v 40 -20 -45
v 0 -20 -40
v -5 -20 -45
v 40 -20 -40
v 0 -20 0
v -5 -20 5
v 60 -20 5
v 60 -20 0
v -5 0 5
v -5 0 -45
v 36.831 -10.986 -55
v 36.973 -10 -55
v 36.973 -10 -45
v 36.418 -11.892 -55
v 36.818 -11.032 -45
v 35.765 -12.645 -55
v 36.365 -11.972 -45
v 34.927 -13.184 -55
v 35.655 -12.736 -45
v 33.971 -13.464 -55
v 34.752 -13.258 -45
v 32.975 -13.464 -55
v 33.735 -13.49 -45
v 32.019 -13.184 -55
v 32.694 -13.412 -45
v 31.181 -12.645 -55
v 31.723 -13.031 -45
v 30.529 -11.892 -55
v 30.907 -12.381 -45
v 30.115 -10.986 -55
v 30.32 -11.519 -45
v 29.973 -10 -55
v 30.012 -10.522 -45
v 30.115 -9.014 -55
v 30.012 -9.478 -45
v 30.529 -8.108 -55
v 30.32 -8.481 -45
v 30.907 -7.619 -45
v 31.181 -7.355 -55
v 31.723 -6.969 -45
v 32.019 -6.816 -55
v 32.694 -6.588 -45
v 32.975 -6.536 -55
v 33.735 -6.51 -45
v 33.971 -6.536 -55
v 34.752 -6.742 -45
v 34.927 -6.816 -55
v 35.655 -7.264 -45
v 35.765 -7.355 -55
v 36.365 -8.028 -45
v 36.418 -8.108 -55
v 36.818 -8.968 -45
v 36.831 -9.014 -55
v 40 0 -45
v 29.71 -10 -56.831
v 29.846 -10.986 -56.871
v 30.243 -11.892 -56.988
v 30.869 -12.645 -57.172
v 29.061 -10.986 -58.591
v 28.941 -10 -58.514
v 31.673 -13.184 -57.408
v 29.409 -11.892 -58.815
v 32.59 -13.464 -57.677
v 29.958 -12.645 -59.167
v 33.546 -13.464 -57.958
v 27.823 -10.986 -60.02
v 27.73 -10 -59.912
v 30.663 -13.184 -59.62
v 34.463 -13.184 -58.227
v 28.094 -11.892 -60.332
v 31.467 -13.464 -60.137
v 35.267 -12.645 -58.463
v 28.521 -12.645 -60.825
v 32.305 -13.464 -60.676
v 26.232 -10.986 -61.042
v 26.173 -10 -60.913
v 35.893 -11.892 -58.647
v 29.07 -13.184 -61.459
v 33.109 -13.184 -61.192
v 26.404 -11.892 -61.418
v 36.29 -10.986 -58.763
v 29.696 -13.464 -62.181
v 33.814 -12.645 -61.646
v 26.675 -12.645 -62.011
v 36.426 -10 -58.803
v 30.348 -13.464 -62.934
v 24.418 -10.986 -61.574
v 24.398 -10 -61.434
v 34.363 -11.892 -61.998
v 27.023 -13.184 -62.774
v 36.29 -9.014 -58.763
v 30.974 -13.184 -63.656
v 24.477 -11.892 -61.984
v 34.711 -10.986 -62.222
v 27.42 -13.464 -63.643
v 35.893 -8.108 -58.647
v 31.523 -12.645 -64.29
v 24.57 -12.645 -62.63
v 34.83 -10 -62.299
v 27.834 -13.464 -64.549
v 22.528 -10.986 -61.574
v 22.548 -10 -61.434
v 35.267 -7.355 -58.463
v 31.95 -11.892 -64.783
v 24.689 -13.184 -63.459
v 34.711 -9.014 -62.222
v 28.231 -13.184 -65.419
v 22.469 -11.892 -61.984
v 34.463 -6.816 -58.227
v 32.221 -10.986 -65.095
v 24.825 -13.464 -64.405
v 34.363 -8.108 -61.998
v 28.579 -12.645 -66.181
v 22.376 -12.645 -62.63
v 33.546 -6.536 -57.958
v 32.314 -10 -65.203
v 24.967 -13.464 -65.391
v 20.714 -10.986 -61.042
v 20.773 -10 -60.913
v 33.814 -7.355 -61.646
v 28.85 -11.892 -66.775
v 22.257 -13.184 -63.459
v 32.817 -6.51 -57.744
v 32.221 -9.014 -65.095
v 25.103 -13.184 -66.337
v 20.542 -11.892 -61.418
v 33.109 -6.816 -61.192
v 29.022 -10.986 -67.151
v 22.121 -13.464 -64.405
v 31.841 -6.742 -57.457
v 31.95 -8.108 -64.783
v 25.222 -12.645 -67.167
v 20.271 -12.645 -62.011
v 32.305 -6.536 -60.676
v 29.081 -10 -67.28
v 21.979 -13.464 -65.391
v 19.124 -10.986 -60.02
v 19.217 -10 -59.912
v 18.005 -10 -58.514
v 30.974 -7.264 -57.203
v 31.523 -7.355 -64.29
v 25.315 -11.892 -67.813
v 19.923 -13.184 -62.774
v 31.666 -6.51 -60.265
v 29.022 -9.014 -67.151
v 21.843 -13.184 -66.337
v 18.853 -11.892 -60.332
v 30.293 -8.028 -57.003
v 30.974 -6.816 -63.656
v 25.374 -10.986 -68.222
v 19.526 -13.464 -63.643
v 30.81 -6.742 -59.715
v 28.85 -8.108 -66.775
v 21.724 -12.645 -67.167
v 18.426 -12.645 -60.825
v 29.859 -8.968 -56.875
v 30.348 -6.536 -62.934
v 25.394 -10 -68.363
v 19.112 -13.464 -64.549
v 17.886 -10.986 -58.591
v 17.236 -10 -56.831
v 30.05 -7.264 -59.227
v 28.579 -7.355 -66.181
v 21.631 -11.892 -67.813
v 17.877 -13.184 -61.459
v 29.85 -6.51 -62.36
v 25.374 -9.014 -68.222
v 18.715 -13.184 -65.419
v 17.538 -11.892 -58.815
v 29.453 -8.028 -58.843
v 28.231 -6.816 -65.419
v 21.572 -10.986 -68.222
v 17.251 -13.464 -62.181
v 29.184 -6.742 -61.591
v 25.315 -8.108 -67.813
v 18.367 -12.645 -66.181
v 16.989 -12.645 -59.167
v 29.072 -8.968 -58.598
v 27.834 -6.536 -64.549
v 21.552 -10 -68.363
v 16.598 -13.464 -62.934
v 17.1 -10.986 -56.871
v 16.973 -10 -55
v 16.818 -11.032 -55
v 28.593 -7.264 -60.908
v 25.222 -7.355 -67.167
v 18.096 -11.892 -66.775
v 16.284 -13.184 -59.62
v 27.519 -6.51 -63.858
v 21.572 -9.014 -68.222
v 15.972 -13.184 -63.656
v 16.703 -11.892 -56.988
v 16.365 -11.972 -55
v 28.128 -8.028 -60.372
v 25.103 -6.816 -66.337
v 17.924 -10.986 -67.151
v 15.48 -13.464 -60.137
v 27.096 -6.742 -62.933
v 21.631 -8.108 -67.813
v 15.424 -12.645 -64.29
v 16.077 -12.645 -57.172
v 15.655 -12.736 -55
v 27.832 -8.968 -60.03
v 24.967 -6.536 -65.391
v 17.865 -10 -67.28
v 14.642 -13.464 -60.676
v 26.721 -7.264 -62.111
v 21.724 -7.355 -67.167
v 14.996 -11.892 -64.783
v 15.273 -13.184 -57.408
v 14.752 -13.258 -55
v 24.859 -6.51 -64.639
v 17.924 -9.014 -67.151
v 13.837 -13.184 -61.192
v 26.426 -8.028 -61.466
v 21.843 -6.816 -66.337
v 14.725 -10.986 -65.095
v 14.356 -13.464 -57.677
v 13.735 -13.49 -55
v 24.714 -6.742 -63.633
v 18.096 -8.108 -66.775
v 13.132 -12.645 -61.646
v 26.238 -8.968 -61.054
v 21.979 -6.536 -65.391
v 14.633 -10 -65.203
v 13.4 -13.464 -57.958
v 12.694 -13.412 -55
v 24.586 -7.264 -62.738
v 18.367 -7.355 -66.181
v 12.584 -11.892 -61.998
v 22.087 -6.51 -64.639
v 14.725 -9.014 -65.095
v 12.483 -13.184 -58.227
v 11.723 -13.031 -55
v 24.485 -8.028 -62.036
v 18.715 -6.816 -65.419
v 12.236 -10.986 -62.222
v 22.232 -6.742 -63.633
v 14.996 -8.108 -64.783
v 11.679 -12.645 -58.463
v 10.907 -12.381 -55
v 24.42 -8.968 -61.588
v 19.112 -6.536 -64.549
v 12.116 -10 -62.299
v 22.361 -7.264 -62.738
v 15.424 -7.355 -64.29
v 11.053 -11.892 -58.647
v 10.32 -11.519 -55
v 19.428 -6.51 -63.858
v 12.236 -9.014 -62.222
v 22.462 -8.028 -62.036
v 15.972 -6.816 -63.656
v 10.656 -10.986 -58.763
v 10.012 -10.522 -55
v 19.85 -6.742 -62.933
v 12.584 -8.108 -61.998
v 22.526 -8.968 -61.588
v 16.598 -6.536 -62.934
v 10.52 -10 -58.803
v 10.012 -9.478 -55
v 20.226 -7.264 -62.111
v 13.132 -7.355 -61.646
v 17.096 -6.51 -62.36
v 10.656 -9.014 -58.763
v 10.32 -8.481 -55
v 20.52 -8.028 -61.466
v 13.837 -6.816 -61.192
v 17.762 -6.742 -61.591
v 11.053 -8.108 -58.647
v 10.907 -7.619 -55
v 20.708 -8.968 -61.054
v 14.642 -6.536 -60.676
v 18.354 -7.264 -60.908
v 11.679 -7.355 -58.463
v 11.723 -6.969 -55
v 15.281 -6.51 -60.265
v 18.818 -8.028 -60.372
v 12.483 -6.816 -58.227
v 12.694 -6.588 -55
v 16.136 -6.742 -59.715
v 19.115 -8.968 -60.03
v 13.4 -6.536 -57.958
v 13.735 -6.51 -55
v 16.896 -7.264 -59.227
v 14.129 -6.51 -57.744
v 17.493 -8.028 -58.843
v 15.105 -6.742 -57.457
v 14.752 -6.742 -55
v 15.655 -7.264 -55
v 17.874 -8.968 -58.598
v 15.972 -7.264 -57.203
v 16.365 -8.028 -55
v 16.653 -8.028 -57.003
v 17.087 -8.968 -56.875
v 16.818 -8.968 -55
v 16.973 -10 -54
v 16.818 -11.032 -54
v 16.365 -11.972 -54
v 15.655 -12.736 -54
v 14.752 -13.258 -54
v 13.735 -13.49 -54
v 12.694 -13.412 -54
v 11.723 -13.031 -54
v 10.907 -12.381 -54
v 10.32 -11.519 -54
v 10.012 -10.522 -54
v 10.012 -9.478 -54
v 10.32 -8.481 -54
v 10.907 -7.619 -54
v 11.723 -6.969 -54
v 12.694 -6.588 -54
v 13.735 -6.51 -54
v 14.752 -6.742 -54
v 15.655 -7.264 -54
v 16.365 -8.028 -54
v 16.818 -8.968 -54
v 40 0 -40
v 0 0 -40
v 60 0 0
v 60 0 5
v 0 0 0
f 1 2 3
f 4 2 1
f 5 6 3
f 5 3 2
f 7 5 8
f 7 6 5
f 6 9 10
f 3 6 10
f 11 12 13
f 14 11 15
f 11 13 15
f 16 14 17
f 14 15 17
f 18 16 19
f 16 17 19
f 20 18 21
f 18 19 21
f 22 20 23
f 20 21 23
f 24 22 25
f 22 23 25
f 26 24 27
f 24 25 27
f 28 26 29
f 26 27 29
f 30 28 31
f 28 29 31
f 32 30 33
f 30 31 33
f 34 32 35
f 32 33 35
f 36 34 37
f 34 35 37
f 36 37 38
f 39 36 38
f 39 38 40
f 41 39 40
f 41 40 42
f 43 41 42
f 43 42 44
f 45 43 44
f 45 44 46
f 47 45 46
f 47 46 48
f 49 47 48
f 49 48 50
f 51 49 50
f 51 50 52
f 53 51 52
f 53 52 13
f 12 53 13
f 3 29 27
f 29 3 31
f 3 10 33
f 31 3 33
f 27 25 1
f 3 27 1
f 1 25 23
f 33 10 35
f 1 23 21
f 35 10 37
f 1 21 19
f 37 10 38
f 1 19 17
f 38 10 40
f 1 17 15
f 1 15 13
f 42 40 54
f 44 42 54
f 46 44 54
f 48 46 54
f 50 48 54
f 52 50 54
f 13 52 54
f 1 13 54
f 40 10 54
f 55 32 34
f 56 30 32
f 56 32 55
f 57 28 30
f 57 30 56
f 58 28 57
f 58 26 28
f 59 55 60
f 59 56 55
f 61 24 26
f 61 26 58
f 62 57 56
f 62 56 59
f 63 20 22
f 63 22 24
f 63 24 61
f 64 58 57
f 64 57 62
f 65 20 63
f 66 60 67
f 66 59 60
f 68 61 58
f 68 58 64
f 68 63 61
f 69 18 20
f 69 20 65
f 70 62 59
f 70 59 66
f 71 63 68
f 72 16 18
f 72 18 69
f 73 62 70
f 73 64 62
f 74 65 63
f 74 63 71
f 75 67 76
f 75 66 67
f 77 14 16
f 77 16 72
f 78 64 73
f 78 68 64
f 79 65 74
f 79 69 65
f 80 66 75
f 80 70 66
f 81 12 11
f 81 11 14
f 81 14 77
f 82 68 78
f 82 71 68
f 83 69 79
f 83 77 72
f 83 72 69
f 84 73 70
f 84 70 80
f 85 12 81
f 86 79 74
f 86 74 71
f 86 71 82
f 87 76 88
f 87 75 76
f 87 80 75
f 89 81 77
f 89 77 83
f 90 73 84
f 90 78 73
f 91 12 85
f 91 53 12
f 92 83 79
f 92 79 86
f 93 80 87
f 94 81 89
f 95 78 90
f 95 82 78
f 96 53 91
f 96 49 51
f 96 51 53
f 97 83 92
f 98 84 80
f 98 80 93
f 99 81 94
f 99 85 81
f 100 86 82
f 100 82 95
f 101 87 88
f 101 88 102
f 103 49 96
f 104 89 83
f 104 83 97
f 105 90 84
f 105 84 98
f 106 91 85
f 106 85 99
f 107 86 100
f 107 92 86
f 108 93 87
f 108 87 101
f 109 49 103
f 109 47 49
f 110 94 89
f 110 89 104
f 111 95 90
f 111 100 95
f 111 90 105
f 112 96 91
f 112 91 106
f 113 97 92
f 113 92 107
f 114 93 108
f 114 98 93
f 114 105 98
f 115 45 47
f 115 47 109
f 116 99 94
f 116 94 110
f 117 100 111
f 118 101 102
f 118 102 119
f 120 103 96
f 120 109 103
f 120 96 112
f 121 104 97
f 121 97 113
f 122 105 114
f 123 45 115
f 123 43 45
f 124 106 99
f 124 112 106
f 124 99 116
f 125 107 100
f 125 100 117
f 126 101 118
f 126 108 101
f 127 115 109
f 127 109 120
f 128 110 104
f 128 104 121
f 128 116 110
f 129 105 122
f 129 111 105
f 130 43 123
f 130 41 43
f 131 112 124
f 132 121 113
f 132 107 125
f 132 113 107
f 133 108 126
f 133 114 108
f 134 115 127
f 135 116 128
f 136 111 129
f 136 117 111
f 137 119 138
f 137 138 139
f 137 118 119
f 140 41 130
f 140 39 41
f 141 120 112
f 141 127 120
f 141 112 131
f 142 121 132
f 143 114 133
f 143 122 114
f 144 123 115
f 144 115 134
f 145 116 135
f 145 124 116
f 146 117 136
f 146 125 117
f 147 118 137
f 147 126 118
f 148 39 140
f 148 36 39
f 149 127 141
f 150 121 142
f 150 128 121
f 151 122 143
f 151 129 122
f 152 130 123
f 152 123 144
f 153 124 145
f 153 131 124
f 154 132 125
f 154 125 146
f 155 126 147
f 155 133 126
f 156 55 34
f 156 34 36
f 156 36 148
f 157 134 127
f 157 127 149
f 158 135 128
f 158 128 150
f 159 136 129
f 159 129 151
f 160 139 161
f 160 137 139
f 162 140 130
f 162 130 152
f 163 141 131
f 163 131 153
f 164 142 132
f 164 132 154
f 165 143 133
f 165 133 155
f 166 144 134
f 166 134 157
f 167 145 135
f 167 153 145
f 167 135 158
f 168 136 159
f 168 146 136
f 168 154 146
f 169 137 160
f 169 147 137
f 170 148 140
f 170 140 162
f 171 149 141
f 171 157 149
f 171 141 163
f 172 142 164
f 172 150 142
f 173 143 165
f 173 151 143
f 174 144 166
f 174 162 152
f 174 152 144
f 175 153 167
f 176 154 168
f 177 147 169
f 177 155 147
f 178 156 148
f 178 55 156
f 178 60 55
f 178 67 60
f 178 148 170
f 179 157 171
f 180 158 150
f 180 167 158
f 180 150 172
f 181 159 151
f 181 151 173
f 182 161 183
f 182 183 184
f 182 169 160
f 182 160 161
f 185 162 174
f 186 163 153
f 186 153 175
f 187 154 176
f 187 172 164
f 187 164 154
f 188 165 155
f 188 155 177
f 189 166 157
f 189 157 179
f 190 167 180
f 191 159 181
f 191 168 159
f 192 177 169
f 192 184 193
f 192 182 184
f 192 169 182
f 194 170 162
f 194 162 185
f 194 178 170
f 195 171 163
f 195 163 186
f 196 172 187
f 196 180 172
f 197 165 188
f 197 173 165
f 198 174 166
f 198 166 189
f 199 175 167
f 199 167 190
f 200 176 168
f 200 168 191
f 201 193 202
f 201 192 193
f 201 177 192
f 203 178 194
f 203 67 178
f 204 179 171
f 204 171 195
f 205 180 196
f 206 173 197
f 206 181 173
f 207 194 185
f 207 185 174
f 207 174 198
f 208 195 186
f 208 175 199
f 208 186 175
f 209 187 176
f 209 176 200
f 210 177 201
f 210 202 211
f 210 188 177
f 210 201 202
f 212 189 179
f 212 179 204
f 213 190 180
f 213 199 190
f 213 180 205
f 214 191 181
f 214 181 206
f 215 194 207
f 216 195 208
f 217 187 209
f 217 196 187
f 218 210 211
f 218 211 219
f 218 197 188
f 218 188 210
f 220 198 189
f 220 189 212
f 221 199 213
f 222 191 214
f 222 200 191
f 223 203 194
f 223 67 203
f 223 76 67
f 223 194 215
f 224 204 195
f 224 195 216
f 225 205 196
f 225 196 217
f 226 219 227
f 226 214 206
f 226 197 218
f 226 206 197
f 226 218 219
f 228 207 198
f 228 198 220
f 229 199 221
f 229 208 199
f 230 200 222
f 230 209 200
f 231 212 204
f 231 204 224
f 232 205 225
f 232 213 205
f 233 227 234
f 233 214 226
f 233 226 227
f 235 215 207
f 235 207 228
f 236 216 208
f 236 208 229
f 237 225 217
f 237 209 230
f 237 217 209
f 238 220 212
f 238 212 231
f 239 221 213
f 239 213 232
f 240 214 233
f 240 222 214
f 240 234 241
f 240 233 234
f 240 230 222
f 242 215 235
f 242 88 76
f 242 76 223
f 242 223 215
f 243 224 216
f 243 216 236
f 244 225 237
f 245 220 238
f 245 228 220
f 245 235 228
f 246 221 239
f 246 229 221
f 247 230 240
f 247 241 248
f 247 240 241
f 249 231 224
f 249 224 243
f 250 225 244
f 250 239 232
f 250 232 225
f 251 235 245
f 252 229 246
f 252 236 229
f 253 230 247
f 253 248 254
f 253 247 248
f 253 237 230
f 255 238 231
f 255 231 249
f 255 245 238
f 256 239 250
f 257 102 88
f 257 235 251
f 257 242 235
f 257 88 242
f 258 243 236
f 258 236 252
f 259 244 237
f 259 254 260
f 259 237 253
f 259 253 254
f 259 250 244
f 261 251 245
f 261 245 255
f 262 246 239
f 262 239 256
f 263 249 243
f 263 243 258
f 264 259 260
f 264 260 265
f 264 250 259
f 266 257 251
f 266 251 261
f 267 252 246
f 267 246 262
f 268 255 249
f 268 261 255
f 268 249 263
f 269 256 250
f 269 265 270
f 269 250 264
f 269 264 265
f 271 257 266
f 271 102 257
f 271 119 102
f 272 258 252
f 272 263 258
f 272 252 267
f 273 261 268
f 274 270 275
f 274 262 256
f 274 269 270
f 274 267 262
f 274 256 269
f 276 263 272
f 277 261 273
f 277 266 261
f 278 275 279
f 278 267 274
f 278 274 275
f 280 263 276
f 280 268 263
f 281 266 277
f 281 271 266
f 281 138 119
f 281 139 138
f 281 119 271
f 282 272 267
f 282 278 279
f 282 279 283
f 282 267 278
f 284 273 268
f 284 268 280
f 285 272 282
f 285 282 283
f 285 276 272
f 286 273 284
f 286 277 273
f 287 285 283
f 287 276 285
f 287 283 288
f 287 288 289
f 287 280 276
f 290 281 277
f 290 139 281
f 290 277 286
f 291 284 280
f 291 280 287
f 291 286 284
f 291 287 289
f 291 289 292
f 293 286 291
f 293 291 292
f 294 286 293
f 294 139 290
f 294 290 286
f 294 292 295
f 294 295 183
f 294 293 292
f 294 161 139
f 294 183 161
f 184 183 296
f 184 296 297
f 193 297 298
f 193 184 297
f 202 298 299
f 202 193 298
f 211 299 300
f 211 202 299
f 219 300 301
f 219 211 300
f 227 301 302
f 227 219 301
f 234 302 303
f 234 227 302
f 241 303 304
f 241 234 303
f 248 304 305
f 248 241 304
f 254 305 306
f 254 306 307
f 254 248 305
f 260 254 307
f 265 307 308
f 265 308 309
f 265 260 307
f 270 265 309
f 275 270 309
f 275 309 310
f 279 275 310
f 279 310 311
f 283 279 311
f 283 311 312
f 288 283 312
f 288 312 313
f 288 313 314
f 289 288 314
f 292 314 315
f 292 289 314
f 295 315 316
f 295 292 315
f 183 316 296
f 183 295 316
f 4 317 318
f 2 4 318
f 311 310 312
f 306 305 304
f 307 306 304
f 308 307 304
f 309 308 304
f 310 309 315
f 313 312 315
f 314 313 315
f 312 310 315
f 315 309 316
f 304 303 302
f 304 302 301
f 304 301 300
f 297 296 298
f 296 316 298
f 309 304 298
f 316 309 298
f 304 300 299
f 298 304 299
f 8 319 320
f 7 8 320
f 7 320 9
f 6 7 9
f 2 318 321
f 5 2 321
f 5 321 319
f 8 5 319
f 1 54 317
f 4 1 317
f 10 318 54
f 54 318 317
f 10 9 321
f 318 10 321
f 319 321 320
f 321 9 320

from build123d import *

# Parameters (mm, degrees)
F1_DEPTH  = 20
F3_R      = 3.5
F4_DEPTH  = 10
F8_R      = 3.5
F9_DEPTH  = 1
F9_FACE_R = 3.5


with BuildPart() as f1:
    # F0 (on Front) → F1 (new body)
    with BuildSketch(Plane.XZ):
        Polygon((0, -40), (0, 0), (60, 0), (60, 5), (-5, 5), (-5, -45), (40, -45), (40, -40), align=None)
    extrude(amount=F1_DEPTH)

    # F3 (on offset) → F4 (join)
    with BuildSketch(Plane(origin=(0, 0, -45), x_dir=(1, 0, 0), z_dir=(0, 0, -1))):
        with Locations((33.4731638432, 10)):
            Circle(F3_R)
    extrude(amount=F4_DEPTH)



with BuildPart() as f9:
    # F8 (on offset) → F9 (new body)
    with BuildSketch(Plane(origin=(0, 0, -55), x_dir=(1, 0, 0), z_dir=(0, 0, -1))):
        with Locations((13.4731638432, 10)):
            Circle(F8_R)
    extrude(amount=-F9_DEPTH)


with BuildPart() as f1_1:
    add(f1.part)

    add(f9.part)  # F10 merges F9
    # F10: sweep along a path in F6
    with BuildLine(Plane(origin=(0, -10, 0), x_dir=(-1, 0, 0), z_dir=(0, 1, 0))) as f10_path:
        ThreePointArc((-33.4731638432, -55), (-23.4731638432, -65), (-13.4731638432, -55))
    # F9_face (on face) → F10 (sweep)
    with BuildSketch(Plane(origin=(13.4731638432, -10, -55), x_dir=(1, 0, 0), z_dir=(0, 0, -1))):
        Circle(F9_FACE_R)
    sweep(path=f10_path.line)


solid = f1_1.part
